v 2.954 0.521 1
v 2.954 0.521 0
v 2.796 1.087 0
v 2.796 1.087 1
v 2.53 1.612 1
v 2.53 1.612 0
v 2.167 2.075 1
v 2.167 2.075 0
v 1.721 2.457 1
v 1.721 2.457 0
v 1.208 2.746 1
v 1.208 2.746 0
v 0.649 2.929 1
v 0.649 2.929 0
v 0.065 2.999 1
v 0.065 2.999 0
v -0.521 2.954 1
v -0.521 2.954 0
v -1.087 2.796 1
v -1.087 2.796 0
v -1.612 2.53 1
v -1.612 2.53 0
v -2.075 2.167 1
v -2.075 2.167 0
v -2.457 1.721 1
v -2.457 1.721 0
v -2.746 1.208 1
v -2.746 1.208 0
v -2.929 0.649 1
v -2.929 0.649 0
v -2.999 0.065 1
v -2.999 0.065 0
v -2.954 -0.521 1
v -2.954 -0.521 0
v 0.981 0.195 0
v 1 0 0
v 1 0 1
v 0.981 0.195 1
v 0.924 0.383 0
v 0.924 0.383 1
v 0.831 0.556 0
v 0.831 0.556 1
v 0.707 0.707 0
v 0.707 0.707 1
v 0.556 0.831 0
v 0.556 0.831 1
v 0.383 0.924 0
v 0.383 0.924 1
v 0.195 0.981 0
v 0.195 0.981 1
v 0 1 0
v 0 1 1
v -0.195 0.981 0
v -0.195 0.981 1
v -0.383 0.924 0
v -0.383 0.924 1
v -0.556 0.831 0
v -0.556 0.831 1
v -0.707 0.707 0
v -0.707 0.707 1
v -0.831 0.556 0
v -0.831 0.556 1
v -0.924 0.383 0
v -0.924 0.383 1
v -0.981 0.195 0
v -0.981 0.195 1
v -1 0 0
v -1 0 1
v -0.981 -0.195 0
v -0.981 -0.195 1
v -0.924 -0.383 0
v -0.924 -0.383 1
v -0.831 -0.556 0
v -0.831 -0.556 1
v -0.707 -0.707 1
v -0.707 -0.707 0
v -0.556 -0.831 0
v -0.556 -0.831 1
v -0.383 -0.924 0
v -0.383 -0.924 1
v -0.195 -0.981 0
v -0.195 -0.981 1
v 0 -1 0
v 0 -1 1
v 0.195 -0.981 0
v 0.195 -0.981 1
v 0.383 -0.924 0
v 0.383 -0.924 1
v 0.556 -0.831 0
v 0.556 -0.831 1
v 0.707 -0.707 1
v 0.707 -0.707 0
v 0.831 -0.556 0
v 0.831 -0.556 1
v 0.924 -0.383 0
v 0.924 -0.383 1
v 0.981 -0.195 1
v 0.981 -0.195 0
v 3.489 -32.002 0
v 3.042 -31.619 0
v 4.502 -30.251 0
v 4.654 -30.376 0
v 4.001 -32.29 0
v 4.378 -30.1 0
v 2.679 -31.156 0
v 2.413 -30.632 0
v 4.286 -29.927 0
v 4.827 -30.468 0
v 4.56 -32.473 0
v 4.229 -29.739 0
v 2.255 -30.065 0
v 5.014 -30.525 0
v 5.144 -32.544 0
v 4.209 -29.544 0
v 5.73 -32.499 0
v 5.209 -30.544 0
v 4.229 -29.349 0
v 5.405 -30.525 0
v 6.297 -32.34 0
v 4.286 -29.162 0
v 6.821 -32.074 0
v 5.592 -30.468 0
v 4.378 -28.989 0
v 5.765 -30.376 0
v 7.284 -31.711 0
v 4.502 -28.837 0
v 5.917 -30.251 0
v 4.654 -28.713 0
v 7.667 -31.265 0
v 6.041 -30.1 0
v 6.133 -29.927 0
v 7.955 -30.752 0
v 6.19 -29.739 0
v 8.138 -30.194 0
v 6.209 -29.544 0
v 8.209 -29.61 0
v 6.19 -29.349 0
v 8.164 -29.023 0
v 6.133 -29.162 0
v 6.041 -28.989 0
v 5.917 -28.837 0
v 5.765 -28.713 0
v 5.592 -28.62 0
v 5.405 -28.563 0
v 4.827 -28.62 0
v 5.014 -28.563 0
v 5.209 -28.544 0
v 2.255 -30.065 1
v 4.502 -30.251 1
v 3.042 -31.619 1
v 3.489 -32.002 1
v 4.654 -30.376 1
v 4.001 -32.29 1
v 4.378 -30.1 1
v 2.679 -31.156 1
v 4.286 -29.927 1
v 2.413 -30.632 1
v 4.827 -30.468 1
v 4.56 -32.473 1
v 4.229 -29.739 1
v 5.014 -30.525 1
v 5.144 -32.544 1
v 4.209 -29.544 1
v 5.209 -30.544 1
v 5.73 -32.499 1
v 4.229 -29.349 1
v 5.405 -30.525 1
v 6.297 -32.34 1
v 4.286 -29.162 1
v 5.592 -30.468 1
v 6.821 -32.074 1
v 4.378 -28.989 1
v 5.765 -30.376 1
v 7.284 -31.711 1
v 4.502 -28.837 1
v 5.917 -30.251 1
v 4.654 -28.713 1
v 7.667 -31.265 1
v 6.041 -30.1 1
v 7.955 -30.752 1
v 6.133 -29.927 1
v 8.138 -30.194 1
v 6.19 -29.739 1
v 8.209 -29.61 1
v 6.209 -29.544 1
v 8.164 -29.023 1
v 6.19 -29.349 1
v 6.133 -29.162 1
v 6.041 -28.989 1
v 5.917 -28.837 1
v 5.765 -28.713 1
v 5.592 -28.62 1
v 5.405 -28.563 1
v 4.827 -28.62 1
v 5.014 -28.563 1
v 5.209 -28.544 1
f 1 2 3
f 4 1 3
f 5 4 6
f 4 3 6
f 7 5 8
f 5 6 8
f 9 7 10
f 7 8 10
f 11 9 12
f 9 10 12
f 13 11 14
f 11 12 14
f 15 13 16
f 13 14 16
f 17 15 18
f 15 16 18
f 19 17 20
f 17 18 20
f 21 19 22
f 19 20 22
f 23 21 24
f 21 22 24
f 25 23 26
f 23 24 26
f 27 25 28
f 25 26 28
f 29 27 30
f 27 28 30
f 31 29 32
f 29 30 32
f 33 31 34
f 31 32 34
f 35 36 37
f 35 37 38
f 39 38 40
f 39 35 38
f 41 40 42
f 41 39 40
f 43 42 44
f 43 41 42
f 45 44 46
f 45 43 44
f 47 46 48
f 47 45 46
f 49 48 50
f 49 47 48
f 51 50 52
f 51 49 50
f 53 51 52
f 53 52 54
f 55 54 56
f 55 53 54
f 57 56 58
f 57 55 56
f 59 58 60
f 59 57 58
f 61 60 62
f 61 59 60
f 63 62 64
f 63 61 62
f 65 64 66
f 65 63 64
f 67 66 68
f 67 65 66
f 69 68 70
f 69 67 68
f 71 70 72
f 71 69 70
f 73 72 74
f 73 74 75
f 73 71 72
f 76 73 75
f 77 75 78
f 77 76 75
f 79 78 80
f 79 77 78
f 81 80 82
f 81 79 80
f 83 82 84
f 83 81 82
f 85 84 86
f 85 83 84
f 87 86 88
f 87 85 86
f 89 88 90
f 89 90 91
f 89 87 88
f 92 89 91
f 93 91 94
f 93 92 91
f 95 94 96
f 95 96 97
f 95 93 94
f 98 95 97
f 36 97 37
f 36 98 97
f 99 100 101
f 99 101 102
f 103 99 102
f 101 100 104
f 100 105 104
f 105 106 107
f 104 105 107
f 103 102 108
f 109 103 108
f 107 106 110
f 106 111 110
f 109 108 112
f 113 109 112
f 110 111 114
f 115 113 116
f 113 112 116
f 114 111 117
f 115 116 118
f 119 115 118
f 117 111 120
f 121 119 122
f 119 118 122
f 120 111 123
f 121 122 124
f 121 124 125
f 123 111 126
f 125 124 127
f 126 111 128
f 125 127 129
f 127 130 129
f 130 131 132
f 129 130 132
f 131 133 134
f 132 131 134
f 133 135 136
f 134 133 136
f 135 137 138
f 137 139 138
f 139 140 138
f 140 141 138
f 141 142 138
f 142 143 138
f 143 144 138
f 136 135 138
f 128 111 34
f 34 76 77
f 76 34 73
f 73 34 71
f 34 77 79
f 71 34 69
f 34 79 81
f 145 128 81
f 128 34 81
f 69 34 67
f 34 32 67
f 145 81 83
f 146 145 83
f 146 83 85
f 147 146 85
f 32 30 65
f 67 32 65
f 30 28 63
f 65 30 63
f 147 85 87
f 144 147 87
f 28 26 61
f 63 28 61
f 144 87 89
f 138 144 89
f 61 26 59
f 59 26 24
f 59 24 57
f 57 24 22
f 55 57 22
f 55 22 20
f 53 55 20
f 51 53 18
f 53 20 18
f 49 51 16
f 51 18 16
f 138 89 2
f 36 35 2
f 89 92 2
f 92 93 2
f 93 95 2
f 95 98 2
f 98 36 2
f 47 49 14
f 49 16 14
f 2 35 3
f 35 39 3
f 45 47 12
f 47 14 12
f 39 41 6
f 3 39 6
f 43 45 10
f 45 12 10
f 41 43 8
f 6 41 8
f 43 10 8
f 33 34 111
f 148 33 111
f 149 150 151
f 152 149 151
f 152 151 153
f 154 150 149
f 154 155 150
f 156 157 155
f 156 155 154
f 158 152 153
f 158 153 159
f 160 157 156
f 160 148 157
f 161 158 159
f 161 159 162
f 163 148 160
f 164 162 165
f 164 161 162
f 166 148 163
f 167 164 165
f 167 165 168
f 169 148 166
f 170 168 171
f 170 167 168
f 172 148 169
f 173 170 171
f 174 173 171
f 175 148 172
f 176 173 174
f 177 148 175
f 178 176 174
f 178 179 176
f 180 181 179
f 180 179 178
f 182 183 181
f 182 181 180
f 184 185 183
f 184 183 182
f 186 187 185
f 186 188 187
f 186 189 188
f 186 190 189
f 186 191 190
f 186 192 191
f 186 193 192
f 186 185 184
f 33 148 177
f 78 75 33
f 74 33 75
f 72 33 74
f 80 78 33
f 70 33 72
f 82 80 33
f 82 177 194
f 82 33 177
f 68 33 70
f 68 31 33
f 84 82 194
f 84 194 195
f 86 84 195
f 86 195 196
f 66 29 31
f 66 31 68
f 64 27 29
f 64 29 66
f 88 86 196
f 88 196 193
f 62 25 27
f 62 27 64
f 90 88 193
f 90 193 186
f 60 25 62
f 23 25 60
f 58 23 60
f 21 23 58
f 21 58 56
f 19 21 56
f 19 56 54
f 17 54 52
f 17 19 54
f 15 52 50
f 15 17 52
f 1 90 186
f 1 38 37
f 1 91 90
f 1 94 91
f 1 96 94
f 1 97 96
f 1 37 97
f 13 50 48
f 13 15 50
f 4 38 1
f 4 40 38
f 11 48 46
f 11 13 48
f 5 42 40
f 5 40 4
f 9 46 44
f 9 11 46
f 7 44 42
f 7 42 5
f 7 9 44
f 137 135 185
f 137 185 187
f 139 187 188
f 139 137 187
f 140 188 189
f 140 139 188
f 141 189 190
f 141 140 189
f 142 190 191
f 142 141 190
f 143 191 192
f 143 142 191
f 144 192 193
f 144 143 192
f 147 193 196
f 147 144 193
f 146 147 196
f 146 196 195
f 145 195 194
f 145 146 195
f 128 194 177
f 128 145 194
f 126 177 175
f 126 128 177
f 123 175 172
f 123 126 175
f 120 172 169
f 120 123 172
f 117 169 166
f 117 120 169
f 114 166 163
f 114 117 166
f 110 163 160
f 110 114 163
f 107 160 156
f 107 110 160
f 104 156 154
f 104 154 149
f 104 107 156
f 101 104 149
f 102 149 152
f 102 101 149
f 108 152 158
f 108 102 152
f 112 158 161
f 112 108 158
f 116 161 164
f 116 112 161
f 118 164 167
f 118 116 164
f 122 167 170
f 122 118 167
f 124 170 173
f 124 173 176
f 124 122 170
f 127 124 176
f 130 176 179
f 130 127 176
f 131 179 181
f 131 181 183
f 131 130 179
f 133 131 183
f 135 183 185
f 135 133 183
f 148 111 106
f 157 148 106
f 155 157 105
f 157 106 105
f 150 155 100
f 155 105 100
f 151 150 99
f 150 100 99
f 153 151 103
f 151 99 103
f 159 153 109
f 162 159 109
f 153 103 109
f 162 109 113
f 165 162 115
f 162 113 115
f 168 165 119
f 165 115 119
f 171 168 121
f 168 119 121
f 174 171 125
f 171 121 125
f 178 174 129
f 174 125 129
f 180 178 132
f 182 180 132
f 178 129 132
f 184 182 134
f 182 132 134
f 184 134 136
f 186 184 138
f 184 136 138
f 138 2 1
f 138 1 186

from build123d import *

# Parameters (mm, degrees)
SKETCH_R  = 1
PAD_DEPTH = 1


with BuildPart() as part:
    # Sketch → Pad (new body)
    with BuildSketch(Plane.XY):
        with BuildLine():
            ThreePointArc((2.954423, 0.520945), (-0.520945, 2.954423), (-2.954423, -0.520945))
            Line((-2.954423, -0.520945), (2.255022, -30.065177))
            ThreePointArc((2.255022, -30.065177), (5.73039, -32.498656), (8.163869, -29.023288))
            Line((2.954423, 0.520945), (8.163869, -29.023288))
        make_face()
        Circle(SKETCH_R, mode=Mode.SUBTRACT)
        with Locations((5.209445, -29.544233)):
            Circle(SKETCH_R, mode=Mode.SUBTRACT)
    extrude(amount=PAD_DEPTH)


solid = part.part
